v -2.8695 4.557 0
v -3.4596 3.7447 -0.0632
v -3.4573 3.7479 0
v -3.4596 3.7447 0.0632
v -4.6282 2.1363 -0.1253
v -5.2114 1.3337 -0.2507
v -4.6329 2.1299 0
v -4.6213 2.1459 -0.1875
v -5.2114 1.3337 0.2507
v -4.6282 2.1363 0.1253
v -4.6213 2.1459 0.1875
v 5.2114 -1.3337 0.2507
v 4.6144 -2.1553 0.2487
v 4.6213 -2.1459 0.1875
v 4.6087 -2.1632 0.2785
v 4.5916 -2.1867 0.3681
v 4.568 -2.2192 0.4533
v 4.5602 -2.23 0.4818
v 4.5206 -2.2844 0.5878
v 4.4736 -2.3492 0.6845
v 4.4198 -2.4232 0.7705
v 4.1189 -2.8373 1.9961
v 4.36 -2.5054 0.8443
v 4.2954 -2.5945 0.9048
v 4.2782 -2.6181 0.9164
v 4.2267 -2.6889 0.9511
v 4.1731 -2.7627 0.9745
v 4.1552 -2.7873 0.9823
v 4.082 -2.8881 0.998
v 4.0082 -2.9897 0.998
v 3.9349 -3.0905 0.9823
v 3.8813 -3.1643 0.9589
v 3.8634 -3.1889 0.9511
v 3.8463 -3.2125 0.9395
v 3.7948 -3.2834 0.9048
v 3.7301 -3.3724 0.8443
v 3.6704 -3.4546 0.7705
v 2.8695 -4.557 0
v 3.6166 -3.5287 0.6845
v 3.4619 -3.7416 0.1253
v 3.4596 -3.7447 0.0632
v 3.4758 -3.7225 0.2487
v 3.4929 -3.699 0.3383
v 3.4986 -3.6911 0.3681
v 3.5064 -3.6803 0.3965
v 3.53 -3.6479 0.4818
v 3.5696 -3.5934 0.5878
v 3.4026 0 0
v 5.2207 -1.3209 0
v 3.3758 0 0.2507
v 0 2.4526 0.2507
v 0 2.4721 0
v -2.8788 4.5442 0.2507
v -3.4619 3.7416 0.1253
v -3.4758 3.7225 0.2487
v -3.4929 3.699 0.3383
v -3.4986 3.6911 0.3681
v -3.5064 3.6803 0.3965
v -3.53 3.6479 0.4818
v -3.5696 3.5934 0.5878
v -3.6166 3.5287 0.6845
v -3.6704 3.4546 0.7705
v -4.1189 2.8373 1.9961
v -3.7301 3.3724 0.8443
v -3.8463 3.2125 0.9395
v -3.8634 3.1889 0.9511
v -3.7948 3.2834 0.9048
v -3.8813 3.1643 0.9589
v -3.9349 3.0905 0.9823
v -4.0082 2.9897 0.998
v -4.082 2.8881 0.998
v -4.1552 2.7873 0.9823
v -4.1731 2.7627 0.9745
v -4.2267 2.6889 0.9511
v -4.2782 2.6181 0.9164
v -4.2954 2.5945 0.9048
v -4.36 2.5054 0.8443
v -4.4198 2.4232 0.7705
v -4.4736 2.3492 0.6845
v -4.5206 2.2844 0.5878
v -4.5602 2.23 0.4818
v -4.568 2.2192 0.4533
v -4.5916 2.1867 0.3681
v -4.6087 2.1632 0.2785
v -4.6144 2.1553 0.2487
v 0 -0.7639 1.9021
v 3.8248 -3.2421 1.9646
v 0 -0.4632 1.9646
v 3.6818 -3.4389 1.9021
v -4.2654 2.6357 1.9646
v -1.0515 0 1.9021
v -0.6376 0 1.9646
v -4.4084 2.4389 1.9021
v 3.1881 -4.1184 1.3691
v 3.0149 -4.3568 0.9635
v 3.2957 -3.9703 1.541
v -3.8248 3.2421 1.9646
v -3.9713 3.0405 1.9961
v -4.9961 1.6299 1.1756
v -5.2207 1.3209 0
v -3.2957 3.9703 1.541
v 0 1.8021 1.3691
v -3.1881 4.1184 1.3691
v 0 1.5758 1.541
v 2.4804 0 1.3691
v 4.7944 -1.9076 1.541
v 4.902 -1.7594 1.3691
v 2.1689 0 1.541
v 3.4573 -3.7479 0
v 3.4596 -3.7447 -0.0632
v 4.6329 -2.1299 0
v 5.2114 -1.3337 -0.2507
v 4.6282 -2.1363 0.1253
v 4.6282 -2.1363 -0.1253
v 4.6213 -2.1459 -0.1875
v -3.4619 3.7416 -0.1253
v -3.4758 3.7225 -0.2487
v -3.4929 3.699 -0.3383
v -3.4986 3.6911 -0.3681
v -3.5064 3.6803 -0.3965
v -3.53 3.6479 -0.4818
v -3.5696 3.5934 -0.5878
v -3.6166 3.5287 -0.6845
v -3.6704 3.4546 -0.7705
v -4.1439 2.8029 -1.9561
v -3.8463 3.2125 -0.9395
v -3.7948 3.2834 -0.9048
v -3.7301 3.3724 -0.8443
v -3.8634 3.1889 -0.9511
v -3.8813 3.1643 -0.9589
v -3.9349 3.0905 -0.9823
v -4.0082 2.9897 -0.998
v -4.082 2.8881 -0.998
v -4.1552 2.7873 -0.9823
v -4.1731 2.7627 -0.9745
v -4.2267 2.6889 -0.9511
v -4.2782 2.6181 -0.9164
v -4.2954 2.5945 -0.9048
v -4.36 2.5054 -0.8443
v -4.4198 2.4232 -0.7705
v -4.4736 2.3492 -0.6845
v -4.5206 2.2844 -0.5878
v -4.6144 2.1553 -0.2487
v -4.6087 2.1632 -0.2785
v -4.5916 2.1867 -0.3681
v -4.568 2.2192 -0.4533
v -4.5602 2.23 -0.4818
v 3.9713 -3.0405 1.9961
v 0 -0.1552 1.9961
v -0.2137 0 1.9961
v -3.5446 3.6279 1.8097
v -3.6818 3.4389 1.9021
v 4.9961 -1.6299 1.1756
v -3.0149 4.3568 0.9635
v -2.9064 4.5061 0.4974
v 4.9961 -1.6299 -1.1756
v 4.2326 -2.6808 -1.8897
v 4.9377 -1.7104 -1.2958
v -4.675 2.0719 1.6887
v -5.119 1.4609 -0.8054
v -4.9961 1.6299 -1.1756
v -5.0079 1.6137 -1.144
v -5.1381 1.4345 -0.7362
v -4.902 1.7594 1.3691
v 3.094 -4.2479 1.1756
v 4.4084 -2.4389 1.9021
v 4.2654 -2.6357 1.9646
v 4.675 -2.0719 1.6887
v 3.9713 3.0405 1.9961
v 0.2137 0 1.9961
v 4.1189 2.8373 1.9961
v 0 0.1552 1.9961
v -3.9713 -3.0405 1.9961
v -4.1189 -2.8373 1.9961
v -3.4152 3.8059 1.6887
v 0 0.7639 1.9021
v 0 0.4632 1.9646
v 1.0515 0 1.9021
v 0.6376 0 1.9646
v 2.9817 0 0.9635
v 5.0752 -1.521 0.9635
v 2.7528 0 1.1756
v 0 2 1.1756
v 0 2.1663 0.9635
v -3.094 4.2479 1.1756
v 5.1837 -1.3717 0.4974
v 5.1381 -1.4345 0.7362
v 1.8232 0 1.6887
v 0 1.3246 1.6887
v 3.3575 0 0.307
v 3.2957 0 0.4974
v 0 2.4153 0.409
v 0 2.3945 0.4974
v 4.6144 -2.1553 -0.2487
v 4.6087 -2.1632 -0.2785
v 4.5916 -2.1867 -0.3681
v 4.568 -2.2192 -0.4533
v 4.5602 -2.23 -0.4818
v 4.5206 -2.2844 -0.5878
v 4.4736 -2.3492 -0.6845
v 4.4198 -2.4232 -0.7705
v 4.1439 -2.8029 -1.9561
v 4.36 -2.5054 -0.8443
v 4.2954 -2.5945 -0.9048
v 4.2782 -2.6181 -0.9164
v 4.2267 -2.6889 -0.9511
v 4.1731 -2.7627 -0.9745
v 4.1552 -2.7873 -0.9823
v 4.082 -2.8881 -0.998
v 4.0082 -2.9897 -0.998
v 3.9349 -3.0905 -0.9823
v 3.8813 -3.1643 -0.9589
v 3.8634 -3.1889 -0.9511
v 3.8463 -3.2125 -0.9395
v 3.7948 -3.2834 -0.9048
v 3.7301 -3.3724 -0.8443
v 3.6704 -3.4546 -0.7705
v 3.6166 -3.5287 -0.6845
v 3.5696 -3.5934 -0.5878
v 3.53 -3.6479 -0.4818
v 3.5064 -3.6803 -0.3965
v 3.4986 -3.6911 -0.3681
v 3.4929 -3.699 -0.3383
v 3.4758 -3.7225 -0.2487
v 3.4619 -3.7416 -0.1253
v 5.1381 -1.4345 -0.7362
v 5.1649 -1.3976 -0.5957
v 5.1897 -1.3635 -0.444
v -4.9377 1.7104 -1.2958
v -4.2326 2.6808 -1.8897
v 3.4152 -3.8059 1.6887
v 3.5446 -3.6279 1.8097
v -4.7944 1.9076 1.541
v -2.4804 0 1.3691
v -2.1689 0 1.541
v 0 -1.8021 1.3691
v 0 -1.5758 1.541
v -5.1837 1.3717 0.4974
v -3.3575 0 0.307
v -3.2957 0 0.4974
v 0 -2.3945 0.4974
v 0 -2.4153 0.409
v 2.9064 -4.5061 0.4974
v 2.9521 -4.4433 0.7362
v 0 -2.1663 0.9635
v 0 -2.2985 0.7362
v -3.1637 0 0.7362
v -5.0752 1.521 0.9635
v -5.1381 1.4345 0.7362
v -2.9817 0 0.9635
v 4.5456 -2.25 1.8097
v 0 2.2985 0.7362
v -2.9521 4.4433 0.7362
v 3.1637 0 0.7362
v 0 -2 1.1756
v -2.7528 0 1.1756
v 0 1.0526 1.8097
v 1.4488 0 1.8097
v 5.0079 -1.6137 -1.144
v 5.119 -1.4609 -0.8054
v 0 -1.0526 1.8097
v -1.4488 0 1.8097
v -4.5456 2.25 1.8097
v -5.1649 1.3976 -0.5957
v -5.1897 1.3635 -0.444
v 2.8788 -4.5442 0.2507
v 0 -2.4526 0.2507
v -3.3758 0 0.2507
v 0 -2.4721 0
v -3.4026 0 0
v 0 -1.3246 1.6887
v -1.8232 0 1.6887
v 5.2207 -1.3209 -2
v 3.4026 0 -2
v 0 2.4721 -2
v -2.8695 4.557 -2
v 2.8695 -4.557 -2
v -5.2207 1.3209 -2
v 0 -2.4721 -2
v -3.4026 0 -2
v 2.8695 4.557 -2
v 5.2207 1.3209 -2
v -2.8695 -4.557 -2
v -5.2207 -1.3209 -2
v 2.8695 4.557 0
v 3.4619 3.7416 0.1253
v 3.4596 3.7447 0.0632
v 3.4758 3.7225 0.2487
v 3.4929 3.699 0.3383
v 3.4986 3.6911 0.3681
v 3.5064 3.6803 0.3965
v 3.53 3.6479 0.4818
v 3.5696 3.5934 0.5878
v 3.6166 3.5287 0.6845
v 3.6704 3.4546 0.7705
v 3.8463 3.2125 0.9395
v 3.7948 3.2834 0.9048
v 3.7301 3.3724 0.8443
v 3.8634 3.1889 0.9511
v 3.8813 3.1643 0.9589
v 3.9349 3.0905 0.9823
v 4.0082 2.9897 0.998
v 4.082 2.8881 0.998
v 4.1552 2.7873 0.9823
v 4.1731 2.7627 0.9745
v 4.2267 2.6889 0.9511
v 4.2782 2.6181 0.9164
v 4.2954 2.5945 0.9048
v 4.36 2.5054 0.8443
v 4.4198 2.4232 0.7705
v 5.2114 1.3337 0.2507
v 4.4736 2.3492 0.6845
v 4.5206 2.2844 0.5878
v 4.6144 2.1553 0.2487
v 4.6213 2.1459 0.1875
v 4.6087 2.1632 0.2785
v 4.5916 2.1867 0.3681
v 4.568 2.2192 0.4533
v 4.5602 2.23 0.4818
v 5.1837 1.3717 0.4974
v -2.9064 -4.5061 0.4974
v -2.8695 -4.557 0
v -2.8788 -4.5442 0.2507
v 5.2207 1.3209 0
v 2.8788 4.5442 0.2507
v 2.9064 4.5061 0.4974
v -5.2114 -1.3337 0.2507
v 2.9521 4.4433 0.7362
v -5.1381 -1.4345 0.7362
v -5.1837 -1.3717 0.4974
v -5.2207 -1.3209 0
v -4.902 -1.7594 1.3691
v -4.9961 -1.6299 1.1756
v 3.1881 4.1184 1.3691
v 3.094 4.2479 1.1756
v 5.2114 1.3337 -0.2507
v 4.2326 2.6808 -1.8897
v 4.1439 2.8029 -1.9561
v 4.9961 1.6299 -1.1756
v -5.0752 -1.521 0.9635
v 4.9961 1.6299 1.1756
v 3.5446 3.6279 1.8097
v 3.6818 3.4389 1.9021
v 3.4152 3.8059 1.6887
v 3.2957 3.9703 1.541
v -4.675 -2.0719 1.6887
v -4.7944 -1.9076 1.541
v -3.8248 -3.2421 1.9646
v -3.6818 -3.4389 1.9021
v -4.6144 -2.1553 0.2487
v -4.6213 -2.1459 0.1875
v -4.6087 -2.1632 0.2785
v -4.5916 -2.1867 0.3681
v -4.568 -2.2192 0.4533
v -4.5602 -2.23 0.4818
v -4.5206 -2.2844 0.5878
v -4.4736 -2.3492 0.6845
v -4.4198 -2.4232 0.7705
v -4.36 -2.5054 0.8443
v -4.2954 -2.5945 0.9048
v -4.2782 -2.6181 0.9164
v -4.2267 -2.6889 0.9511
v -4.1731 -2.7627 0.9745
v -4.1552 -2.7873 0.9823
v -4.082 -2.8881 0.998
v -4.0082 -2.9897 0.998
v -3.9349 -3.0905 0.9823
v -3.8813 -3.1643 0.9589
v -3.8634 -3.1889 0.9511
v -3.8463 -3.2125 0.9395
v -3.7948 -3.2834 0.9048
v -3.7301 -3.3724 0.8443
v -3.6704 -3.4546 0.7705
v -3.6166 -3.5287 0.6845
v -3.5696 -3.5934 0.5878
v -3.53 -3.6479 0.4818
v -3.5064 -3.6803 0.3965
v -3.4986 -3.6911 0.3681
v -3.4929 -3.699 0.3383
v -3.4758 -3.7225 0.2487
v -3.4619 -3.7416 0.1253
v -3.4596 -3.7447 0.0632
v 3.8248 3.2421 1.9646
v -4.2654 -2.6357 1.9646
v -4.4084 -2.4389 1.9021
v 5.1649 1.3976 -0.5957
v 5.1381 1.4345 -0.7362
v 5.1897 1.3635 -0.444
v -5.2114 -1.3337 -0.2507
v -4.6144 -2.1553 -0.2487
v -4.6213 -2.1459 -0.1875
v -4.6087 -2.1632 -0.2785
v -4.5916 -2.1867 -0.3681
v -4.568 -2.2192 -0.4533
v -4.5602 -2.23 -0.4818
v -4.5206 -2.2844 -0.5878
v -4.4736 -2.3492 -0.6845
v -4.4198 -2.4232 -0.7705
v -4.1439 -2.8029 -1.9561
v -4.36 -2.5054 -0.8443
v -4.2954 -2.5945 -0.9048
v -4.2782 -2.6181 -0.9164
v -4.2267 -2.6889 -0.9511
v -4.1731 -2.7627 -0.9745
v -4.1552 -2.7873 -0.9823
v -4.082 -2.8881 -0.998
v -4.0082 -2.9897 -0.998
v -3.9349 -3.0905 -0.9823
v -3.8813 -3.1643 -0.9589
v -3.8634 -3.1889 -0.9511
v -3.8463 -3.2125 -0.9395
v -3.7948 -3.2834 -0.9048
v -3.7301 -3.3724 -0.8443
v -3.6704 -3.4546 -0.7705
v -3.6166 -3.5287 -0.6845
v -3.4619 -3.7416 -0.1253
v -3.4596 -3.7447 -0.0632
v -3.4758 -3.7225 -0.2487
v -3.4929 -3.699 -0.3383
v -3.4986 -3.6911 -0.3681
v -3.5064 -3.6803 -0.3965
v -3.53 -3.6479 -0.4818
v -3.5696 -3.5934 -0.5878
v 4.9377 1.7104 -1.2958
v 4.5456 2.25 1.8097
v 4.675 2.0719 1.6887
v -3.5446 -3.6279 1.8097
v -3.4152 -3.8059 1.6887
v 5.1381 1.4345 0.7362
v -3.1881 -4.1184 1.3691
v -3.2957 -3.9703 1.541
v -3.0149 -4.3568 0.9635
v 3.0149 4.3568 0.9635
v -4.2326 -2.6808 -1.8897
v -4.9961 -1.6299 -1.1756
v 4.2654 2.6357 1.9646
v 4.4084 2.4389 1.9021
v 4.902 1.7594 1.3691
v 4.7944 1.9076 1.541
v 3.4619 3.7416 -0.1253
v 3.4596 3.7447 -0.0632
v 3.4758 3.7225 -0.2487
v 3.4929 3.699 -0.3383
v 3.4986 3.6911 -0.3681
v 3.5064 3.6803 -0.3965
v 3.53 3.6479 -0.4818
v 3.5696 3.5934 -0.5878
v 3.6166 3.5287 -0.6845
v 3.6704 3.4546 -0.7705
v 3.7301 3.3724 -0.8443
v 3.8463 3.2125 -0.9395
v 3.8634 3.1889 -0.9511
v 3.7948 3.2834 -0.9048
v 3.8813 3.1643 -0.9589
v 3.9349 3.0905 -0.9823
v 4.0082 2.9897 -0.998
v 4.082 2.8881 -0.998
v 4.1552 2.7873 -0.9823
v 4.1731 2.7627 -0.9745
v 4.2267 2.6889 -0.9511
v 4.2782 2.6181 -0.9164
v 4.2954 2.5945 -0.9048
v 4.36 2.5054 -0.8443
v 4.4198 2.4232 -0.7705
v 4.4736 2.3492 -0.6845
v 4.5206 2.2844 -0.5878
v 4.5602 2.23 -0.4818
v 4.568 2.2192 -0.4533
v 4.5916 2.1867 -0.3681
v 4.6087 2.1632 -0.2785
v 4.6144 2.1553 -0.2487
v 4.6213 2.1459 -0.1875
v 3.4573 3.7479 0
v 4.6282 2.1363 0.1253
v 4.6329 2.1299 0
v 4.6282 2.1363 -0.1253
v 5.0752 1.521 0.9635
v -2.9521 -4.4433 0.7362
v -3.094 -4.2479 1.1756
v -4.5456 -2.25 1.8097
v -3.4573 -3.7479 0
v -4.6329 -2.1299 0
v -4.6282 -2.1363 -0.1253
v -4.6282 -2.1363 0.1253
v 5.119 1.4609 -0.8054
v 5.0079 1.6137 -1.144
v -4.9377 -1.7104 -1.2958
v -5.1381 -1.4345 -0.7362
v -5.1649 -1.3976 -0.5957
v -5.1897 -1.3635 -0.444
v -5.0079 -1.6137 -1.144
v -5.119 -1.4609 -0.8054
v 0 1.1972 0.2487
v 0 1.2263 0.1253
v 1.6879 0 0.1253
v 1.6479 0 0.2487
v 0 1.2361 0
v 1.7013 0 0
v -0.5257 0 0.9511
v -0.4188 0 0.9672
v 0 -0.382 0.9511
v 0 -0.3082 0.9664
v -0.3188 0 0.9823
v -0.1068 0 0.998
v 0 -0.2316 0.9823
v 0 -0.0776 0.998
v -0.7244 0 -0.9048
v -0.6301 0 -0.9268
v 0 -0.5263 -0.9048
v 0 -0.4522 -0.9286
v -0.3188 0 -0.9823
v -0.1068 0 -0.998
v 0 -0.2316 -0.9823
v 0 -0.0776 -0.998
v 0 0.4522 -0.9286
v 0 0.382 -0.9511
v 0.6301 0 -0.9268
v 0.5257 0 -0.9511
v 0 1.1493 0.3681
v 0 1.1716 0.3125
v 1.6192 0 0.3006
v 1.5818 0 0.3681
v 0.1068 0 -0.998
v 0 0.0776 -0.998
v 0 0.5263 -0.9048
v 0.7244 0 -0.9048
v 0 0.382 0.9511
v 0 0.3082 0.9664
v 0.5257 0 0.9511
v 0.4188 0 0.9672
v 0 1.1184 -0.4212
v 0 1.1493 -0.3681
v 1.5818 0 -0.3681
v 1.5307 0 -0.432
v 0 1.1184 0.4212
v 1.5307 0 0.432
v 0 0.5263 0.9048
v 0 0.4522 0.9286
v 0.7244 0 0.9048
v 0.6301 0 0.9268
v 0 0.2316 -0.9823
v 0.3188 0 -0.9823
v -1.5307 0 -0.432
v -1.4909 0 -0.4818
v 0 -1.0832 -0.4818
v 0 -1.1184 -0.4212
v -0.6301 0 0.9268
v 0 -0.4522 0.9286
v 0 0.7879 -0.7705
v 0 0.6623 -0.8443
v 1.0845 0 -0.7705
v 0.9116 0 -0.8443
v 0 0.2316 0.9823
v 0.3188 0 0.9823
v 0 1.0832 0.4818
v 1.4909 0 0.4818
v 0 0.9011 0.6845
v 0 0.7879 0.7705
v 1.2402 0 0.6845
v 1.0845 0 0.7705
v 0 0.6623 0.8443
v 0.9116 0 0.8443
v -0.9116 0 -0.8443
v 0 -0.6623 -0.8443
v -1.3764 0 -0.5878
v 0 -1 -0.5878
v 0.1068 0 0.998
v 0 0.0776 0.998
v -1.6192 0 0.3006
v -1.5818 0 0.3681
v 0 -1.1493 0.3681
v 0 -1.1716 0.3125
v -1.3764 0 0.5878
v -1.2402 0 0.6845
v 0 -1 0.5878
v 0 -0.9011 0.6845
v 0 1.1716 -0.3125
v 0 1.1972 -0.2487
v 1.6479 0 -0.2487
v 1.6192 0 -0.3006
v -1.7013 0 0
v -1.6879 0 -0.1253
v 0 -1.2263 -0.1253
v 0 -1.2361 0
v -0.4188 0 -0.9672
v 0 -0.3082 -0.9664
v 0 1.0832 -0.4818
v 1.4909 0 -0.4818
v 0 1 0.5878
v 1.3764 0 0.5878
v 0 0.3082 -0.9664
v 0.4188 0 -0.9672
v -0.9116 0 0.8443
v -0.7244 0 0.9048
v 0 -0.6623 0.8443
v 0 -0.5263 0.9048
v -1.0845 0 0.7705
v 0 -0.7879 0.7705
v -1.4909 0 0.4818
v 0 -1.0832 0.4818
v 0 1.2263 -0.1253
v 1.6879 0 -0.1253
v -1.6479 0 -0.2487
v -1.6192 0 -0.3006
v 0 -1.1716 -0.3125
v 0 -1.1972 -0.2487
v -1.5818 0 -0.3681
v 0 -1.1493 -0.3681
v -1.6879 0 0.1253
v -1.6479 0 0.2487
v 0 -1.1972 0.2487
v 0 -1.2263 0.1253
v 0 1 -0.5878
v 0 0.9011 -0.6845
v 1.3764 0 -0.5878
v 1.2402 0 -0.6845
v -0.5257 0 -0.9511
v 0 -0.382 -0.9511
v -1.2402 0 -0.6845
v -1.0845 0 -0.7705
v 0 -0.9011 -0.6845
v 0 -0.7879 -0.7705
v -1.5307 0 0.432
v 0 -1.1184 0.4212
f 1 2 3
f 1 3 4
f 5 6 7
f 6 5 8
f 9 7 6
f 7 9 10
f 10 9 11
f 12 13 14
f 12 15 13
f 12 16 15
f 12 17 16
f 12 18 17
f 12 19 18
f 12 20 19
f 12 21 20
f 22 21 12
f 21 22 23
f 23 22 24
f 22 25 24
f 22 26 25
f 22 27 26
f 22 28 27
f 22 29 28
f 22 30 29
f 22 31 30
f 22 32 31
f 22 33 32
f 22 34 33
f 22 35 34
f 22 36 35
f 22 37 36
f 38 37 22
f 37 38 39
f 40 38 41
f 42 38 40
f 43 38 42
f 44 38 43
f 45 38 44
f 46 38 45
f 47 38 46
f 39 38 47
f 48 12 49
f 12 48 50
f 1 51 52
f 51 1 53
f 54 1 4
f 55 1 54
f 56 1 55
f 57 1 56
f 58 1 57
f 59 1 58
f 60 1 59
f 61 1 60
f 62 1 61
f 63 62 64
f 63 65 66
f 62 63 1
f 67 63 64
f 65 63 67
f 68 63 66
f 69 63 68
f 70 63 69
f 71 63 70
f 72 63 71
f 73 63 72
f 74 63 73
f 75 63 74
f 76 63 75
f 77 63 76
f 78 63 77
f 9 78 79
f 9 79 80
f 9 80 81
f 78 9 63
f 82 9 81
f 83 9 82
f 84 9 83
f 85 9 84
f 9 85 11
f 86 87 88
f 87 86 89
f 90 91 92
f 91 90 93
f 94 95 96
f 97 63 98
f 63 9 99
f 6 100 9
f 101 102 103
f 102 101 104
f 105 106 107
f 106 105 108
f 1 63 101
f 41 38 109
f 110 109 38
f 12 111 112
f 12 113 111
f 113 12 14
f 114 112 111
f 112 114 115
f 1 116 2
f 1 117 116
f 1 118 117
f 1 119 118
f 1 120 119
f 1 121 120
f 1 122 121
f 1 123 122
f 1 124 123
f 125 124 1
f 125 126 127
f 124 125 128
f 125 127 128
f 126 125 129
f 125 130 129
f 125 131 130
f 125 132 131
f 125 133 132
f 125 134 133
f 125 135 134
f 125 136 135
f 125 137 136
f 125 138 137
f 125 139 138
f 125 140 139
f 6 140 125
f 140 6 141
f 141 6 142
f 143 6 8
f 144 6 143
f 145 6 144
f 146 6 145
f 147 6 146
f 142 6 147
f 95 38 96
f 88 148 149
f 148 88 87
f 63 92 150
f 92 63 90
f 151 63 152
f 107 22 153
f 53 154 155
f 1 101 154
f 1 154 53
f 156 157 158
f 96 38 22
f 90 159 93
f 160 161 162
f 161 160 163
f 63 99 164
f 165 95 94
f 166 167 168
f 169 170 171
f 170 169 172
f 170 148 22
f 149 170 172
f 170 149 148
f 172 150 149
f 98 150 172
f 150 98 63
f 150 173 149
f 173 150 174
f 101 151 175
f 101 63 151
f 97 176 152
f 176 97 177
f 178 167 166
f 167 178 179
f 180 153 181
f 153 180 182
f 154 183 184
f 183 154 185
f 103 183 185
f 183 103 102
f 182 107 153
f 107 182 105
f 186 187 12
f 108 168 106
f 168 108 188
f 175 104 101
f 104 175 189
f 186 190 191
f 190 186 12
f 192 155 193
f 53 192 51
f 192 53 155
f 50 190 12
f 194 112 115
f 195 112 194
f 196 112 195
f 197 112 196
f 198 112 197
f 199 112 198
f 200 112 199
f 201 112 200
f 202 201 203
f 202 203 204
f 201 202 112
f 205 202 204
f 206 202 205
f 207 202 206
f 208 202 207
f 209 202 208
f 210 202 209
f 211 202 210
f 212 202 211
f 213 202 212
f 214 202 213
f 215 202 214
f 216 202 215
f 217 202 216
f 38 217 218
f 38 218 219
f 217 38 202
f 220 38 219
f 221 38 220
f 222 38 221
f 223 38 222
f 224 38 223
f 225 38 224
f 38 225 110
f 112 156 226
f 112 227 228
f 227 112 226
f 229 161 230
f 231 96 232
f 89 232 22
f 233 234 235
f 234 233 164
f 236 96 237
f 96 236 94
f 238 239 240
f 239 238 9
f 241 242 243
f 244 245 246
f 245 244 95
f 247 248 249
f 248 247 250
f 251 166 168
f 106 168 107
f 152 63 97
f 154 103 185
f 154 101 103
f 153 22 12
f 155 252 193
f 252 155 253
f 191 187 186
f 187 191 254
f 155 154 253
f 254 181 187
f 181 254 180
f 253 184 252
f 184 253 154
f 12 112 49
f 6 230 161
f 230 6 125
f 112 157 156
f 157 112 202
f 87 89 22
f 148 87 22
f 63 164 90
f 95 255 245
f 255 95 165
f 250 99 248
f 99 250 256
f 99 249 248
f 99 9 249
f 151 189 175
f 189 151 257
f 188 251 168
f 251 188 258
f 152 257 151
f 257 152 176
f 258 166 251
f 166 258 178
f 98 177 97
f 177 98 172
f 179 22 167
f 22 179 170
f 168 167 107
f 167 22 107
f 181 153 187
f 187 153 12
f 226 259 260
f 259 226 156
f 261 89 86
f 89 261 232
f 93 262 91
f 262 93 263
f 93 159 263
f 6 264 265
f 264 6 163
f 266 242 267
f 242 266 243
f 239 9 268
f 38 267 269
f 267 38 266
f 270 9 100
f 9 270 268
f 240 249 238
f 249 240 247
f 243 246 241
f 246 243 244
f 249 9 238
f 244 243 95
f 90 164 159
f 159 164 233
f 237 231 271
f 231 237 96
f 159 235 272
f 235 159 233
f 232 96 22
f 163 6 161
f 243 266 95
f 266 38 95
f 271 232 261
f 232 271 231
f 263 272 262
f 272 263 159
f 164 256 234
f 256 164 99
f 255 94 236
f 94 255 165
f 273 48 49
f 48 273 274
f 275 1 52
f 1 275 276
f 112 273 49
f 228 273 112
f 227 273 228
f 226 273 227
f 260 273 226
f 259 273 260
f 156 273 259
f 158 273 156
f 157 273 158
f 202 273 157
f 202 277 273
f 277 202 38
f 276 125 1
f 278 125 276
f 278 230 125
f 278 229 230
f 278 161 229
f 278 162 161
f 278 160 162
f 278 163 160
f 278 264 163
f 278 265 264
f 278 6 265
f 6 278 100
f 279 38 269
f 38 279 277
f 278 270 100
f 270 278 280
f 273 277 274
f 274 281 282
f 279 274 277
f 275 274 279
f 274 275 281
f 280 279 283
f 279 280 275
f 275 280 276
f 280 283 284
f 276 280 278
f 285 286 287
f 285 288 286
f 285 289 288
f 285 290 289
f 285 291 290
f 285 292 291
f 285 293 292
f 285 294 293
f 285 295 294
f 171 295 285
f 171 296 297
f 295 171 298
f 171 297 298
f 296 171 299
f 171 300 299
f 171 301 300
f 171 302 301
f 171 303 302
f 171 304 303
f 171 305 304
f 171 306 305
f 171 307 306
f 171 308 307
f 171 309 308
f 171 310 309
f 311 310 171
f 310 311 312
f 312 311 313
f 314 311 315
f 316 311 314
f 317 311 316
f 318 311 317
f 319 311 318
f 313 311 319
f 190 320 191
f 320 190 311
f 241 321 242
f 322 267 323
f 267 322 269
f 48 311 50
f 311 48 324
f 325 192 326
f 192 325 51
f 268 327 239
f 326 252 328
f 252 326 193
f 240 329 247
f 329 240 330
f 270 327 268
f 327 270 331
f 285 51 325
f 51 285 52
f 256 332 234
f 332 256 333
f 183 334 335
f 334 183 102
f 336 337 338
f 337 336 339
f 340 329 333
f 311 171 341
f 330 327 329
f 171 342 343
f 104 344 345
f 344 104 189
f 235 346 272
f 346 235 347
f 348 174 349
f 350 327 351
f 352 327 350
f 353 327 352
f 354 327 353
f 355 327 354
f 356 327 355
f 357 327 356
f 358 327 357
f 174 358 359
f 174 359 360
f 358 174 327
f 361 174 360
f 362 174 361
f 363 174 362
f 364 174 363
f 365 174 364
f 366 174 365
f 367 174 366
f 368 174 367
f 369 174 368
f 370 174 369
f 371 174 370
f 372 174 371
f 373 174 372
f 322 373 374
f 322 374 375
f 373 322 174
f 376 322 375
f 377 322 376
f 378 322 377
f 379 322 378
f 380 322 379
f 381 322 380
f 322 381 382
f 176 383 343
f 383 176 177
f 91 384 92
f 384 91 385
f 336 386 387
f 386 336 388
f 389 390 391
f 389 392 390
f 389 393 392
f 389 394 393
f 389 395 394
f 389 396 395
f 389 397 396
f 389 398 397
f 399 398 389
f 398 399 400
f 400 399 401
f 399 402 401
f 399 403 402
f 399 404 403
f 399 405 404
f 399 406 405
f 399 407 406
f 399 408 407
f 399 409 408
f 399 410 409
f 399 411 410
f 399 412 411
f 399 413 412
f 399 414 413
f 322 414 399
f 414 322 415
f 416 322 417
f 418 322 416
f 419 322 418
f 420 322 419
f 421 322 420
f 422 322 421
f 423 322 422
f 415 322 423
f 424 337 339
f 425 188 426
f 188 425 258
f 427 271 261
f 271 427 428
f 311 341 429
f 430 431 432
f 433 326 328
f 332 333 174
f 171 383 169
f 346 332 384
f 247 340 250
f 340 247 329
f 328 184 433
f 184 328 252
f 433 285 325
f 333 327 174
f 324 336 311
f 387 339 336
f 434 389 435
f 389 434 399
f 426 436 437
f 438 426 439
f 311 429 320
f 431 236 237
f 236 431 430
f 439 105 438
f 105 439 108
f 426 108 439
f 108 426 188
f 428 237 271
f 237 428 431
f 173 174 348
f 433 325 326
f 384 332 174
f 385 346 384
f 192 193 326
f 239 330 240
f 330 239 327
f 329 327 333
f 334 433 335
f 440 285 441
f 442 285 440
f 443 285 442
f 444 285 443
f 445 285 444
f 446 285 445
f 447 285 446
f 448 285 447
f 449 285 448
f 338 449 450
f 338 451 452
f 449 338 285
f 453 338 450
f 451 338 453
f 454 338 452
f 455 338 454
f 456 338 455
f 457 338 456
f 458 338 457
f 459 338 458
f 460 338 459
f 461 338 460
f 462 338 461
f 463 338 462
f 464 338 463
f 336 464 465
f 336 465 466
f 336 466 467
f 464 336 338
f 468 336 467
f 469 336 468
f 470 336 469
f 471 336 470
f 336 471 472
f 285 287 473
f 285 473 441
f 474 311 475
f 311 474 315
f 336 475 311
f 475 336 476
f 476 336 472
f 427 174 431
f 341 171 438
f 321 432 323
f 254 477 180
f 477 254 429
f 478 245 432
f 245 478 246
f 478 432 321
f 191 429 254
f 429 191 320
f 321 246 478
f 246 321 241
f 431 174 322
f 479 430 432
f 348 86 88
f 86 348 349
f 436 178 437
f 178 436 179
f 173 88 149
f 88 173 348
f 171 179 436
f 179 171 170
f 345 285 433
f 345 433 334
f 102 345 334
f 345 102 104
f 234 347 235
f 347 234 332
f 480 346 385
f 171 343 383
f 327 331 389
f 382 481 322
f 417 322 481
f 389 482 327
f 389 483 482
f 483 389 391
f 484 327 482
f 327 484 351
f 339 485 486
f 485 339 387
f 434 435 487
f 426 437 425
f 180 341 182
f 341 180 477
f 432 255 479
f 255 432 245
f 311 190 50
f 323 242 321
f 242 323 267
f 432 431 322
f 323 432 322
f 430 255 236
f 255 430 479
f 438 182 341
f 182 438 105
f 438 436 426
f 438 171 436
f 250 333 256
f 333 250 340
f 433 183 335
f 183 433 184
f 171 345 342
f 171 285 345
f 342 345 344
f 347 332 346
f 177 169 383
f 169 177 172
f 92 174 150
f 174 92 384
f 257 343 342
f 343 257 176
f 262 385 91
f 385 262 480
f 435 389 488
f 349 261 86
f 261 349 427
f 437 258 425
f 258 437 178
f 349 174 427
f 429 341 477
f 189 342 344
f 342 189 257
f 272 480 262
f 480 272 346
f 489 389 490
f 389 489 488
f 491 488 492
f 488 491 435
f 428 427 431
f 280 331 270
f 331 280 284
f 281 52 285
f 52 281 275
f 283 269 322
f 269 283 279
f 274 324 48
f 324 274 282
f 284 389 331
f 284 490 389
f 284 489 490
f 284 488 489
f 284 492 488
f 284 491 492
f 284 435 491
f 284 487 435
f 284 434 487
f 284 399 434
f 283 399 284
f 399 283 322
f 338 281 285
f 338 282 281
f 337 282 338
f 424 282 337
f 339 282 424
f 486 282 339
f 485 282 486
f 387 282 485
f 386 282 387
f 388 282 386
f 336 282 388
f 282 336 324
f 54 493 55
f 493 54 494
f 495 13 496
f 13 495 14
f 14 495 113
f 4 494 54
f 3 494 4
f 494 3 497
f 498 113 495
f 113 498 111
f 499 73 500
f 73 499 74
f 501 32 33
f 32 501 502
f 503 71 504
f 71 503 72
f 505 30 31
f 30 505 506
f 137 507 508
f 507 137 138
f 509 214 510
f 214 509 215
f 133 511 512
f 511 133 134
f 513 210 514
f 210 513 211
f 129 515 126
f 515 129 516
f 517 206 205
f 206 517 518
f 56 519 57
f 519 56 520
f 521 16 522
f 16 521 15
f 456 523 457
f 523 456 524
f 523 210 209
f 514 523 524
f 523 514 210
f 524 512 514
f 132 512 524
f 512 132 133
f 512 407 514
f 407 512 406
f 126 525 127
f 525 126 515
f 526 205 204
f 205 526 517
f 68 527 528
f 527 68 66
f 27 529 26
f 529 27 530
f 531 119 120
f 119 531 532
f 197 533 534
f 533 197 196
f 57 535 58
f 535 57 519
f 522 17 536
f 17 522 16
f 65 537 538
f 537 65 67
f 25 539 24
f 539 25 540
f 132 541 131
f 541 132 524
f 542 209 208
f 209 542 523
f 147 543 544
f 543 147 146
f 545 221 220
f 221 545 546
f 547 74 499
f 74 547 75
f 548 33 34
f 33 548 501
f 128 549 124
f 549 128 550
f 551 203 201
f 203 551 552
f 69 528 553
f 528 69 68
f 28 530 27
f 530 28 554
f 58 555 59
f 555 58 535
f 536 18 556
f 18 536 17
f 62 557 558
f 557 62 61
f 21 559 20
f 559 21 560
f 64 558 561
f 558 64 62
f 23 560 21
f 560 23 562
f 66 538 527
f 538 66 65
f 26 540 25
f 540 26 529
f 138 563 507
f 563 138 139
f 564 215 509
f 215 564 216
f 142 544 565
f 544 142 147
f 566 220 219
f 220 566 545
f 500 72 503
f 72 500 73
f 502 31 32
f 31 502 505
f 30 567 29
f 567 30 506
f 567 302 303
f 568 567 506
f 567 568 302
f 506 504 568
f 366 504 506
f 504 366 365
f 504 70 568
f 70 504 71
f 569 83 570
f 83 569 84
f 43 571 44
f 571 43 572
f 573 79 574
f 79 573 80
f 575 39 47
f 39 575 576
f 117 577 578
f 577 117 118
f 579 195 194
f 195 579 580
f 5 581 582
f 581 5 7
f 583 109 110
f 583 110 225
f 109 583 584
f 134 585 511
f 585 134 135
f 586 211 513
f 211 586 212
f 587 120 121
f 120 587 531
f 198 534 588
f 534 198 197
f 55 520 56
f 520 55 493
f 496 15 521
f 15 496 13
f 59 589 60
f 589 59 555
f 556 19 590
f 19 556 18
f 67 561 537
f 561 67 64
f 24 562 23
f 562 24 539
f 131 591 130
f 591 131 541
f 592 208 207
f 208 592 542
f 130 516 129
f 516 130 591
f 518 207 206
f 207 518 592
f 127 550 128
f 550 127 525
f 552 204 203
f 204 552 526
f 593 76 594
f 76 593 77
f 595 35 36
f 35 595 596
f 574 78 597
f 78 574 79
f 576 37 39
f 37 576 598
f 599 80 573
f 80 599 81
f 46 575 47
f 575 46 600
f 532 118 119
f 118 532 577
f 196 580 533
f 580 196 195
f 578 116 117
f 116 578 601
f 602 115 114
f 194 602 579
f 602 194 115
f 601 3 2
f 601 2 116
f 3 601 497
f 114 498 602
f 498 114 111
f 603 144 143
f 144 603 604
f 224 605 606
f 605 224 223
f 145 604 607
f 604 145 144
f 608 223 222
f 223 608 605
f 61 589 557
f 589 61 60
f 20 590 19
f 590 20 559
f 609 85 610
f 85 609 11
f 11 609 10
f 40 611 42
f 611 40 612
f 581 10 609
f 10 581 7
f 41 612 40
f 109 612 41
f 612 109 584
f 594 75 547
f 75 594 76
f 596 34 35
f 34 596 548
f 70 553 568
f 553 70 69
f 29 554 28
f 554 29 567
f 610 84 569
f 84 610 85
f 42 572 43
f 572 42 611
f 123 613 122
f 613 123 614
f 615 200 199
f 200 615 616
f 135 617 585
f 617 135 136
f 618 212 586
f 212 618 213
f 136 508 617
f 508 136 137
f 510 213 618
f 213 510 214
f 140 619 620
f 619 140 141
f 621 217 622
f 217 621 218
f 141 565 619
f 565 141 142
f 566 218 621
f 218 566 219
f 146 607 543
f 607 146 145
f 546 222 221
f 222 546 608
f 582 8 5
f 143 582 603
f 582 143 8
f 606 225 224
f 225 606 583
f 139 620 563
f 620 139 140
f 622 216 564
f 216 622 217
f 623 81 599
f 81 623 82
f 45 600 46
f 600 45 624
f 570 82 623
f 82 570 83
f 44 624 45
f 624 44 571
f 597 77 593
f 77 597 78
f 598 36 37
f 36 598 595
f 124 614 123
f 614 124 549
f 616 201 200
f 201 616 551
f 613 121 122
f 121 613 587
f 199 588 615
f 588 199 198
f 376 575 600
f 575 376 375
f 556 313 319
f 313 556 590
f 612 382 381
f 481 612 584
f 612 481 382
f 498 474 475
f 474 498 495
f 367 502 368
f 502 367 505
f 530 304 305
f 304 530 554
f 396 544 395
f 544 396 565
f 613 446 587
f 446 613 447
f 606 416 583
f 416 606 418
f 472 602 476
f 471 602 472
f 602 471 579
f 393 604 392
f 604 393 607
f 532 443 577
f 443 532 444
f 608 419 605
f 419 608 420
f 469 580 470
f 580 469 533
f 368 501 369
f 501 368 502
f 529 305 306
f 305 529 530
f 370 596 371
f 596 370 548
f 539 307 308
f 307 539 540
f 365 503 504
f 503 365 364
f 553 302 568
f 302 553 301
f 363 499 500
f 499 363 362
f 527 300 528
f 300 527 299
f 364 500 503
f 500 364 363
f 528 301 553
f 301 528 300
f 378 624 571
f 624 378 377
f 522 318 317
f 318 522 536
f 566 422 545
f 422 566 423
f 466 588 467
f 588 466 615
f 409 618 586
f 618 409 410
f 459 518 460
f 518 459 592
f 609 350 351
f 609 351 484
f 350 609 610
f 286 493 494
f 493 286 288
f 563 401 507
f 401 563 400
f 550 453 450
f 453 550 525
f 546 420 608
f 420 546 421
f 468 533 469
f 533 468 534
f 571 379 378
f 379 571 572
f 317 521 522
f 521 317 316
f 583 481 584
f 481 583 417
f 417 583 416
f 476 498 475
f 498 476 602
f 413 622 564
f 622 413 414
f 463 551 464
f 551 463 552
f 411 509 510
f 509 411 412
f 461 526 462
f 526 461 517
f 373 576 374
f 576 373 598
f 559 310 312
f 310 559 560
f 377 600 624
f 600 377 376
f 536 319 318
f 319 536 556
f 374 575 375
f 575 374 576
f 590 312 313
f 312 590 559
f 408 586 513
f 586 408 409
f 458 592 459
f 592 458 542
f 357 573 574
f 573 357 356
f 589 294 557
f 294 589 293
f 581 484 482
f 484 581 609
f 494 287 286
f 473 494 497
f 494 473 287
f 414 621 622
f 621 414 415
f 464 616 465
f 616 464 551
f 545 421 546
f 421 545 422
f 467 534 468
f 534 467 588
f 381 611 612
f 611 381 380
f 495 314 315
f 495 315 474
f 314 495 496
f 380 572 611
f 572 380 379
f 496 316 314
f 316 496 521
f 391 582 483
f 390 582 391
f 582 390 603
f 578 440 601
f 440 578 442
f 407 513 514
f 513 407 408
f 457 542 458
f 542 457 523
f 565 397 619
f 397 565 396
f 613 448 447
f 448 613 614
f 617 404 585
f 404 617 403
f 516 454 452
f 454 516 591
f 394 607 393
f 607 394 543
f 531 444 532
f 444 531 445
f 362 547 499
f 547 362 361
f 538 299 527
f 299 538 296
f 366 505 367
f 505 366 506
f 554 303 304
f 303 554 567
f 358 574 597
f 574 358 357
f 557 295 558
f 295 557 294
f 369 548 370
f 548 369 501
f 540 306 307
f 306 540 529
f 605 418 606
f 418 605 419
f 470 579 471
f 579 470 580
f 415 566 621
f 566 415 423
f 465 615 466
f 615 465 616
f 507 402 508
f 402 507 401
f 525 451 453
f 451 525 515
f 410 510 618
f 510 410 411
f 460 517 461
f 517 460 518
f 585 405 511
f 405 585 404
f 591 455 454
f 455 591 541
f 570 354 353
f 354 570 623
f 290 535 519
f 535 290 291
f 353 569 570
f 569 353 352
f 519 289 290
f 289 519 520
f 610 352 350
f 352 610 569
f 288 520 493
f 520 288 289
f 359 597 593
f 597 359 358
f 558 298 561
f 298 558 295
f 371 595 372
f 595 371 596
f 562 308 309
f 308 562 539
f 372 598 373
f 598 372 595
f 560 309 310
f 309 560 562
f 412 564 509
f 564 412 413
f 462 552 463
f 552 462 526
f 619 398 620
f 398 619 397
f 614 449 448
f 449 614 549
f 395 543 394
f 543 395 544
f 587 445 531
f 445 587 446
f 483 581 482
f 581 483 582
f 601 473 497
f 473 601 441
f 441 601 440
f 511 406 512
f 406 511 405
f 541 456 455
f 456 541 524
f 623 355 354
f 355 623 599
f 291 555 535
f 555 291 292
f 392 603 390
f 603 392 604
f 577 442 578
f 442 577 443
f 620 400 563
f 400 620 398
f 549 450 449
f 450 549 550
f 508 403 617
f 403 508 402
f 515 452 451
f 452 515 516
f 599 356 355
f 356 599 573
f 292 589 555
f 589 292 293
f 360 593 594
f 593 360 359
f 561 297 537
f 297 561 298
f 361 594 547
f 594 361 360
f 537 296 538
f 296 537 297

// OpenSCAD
// file: parameters-nylonshape.scad
//P
//Parameters for nylonrail
//P

// diameter of nylonrail
diameter = 2;
// length of nylonrail
length = 10;
// number of rails (5 corner star -> 5 rails)
number = 5;
// angle between two rails
angle = ((number-2)*180)/number;
//strength of screw rings
ring_strength = 2;
//strength of nylon rails
rail_strength = 1;


//M
//Screw Measurements
//M
//M2 screw, for better hold decrease slightly
screw_diameter = 2;
//smallest diameter of nut
nut = 4;
//largest diameter of nut
nut_l=4.5;

//P
//Parameters for screw ring placement
//P

//with center at the crossing of the two rails,
//this is the distance of the center of the screw ring:

//distance = tan(90-angle/2) * 2 * sin(90-angle/2) / (rail_strength*2+diameter);
betta = 90-angle/2;
total_diameter = 2*ring_strength + diameter;
distance = tan(betta)*( (total_diameter)/sin(betta)+ nut_l)/2;
// main file
include <parameters-nylonshape.scad>;

module x_cutout(diameter, length, angle)
{
	union()
	{
		rotate([90,0,angle/2])
		cylinder(r=diameter/2, h=length*2, center=true, $fn = 50);

		rotate([90,0,-angle/2])
		cylinder(r=diameter/2, h=length*2, center=true, $fn = 50);
	}

}


module x_rails(diameter, length, angle, rail_strength)
{
	union()
	{
		rotate([90,0,angle/2])
		cylinder(r=diameter/2 + rail_strength, h=length, center=true, $fn = 50);

		translate([0,0,-(diameter/2 + rail_strength)/2])
		rotate([90,0,angle/2])
		cube(size=[diameter + 2*rail_strength, diameter/2 + rail_strength, length], center = true);

		rotate([90,0,-angle/2])
		cylinder(r=diameter/2 + rail_strength, h=length, center=true, $fn = 50);

		translate([0,0,-(diameter/2 + rail_strength)/2])
		rotate([90,0,-angle/2])
		cube(size=[diameter + 2*rail_strength, diameter/2 + rail_strength, length], center = true);
	}

}


difference()
{
	x_rails(diameter, length, angle, rail_strength);
	x_cutout(diameter, length, angle, rail_strength);
}
